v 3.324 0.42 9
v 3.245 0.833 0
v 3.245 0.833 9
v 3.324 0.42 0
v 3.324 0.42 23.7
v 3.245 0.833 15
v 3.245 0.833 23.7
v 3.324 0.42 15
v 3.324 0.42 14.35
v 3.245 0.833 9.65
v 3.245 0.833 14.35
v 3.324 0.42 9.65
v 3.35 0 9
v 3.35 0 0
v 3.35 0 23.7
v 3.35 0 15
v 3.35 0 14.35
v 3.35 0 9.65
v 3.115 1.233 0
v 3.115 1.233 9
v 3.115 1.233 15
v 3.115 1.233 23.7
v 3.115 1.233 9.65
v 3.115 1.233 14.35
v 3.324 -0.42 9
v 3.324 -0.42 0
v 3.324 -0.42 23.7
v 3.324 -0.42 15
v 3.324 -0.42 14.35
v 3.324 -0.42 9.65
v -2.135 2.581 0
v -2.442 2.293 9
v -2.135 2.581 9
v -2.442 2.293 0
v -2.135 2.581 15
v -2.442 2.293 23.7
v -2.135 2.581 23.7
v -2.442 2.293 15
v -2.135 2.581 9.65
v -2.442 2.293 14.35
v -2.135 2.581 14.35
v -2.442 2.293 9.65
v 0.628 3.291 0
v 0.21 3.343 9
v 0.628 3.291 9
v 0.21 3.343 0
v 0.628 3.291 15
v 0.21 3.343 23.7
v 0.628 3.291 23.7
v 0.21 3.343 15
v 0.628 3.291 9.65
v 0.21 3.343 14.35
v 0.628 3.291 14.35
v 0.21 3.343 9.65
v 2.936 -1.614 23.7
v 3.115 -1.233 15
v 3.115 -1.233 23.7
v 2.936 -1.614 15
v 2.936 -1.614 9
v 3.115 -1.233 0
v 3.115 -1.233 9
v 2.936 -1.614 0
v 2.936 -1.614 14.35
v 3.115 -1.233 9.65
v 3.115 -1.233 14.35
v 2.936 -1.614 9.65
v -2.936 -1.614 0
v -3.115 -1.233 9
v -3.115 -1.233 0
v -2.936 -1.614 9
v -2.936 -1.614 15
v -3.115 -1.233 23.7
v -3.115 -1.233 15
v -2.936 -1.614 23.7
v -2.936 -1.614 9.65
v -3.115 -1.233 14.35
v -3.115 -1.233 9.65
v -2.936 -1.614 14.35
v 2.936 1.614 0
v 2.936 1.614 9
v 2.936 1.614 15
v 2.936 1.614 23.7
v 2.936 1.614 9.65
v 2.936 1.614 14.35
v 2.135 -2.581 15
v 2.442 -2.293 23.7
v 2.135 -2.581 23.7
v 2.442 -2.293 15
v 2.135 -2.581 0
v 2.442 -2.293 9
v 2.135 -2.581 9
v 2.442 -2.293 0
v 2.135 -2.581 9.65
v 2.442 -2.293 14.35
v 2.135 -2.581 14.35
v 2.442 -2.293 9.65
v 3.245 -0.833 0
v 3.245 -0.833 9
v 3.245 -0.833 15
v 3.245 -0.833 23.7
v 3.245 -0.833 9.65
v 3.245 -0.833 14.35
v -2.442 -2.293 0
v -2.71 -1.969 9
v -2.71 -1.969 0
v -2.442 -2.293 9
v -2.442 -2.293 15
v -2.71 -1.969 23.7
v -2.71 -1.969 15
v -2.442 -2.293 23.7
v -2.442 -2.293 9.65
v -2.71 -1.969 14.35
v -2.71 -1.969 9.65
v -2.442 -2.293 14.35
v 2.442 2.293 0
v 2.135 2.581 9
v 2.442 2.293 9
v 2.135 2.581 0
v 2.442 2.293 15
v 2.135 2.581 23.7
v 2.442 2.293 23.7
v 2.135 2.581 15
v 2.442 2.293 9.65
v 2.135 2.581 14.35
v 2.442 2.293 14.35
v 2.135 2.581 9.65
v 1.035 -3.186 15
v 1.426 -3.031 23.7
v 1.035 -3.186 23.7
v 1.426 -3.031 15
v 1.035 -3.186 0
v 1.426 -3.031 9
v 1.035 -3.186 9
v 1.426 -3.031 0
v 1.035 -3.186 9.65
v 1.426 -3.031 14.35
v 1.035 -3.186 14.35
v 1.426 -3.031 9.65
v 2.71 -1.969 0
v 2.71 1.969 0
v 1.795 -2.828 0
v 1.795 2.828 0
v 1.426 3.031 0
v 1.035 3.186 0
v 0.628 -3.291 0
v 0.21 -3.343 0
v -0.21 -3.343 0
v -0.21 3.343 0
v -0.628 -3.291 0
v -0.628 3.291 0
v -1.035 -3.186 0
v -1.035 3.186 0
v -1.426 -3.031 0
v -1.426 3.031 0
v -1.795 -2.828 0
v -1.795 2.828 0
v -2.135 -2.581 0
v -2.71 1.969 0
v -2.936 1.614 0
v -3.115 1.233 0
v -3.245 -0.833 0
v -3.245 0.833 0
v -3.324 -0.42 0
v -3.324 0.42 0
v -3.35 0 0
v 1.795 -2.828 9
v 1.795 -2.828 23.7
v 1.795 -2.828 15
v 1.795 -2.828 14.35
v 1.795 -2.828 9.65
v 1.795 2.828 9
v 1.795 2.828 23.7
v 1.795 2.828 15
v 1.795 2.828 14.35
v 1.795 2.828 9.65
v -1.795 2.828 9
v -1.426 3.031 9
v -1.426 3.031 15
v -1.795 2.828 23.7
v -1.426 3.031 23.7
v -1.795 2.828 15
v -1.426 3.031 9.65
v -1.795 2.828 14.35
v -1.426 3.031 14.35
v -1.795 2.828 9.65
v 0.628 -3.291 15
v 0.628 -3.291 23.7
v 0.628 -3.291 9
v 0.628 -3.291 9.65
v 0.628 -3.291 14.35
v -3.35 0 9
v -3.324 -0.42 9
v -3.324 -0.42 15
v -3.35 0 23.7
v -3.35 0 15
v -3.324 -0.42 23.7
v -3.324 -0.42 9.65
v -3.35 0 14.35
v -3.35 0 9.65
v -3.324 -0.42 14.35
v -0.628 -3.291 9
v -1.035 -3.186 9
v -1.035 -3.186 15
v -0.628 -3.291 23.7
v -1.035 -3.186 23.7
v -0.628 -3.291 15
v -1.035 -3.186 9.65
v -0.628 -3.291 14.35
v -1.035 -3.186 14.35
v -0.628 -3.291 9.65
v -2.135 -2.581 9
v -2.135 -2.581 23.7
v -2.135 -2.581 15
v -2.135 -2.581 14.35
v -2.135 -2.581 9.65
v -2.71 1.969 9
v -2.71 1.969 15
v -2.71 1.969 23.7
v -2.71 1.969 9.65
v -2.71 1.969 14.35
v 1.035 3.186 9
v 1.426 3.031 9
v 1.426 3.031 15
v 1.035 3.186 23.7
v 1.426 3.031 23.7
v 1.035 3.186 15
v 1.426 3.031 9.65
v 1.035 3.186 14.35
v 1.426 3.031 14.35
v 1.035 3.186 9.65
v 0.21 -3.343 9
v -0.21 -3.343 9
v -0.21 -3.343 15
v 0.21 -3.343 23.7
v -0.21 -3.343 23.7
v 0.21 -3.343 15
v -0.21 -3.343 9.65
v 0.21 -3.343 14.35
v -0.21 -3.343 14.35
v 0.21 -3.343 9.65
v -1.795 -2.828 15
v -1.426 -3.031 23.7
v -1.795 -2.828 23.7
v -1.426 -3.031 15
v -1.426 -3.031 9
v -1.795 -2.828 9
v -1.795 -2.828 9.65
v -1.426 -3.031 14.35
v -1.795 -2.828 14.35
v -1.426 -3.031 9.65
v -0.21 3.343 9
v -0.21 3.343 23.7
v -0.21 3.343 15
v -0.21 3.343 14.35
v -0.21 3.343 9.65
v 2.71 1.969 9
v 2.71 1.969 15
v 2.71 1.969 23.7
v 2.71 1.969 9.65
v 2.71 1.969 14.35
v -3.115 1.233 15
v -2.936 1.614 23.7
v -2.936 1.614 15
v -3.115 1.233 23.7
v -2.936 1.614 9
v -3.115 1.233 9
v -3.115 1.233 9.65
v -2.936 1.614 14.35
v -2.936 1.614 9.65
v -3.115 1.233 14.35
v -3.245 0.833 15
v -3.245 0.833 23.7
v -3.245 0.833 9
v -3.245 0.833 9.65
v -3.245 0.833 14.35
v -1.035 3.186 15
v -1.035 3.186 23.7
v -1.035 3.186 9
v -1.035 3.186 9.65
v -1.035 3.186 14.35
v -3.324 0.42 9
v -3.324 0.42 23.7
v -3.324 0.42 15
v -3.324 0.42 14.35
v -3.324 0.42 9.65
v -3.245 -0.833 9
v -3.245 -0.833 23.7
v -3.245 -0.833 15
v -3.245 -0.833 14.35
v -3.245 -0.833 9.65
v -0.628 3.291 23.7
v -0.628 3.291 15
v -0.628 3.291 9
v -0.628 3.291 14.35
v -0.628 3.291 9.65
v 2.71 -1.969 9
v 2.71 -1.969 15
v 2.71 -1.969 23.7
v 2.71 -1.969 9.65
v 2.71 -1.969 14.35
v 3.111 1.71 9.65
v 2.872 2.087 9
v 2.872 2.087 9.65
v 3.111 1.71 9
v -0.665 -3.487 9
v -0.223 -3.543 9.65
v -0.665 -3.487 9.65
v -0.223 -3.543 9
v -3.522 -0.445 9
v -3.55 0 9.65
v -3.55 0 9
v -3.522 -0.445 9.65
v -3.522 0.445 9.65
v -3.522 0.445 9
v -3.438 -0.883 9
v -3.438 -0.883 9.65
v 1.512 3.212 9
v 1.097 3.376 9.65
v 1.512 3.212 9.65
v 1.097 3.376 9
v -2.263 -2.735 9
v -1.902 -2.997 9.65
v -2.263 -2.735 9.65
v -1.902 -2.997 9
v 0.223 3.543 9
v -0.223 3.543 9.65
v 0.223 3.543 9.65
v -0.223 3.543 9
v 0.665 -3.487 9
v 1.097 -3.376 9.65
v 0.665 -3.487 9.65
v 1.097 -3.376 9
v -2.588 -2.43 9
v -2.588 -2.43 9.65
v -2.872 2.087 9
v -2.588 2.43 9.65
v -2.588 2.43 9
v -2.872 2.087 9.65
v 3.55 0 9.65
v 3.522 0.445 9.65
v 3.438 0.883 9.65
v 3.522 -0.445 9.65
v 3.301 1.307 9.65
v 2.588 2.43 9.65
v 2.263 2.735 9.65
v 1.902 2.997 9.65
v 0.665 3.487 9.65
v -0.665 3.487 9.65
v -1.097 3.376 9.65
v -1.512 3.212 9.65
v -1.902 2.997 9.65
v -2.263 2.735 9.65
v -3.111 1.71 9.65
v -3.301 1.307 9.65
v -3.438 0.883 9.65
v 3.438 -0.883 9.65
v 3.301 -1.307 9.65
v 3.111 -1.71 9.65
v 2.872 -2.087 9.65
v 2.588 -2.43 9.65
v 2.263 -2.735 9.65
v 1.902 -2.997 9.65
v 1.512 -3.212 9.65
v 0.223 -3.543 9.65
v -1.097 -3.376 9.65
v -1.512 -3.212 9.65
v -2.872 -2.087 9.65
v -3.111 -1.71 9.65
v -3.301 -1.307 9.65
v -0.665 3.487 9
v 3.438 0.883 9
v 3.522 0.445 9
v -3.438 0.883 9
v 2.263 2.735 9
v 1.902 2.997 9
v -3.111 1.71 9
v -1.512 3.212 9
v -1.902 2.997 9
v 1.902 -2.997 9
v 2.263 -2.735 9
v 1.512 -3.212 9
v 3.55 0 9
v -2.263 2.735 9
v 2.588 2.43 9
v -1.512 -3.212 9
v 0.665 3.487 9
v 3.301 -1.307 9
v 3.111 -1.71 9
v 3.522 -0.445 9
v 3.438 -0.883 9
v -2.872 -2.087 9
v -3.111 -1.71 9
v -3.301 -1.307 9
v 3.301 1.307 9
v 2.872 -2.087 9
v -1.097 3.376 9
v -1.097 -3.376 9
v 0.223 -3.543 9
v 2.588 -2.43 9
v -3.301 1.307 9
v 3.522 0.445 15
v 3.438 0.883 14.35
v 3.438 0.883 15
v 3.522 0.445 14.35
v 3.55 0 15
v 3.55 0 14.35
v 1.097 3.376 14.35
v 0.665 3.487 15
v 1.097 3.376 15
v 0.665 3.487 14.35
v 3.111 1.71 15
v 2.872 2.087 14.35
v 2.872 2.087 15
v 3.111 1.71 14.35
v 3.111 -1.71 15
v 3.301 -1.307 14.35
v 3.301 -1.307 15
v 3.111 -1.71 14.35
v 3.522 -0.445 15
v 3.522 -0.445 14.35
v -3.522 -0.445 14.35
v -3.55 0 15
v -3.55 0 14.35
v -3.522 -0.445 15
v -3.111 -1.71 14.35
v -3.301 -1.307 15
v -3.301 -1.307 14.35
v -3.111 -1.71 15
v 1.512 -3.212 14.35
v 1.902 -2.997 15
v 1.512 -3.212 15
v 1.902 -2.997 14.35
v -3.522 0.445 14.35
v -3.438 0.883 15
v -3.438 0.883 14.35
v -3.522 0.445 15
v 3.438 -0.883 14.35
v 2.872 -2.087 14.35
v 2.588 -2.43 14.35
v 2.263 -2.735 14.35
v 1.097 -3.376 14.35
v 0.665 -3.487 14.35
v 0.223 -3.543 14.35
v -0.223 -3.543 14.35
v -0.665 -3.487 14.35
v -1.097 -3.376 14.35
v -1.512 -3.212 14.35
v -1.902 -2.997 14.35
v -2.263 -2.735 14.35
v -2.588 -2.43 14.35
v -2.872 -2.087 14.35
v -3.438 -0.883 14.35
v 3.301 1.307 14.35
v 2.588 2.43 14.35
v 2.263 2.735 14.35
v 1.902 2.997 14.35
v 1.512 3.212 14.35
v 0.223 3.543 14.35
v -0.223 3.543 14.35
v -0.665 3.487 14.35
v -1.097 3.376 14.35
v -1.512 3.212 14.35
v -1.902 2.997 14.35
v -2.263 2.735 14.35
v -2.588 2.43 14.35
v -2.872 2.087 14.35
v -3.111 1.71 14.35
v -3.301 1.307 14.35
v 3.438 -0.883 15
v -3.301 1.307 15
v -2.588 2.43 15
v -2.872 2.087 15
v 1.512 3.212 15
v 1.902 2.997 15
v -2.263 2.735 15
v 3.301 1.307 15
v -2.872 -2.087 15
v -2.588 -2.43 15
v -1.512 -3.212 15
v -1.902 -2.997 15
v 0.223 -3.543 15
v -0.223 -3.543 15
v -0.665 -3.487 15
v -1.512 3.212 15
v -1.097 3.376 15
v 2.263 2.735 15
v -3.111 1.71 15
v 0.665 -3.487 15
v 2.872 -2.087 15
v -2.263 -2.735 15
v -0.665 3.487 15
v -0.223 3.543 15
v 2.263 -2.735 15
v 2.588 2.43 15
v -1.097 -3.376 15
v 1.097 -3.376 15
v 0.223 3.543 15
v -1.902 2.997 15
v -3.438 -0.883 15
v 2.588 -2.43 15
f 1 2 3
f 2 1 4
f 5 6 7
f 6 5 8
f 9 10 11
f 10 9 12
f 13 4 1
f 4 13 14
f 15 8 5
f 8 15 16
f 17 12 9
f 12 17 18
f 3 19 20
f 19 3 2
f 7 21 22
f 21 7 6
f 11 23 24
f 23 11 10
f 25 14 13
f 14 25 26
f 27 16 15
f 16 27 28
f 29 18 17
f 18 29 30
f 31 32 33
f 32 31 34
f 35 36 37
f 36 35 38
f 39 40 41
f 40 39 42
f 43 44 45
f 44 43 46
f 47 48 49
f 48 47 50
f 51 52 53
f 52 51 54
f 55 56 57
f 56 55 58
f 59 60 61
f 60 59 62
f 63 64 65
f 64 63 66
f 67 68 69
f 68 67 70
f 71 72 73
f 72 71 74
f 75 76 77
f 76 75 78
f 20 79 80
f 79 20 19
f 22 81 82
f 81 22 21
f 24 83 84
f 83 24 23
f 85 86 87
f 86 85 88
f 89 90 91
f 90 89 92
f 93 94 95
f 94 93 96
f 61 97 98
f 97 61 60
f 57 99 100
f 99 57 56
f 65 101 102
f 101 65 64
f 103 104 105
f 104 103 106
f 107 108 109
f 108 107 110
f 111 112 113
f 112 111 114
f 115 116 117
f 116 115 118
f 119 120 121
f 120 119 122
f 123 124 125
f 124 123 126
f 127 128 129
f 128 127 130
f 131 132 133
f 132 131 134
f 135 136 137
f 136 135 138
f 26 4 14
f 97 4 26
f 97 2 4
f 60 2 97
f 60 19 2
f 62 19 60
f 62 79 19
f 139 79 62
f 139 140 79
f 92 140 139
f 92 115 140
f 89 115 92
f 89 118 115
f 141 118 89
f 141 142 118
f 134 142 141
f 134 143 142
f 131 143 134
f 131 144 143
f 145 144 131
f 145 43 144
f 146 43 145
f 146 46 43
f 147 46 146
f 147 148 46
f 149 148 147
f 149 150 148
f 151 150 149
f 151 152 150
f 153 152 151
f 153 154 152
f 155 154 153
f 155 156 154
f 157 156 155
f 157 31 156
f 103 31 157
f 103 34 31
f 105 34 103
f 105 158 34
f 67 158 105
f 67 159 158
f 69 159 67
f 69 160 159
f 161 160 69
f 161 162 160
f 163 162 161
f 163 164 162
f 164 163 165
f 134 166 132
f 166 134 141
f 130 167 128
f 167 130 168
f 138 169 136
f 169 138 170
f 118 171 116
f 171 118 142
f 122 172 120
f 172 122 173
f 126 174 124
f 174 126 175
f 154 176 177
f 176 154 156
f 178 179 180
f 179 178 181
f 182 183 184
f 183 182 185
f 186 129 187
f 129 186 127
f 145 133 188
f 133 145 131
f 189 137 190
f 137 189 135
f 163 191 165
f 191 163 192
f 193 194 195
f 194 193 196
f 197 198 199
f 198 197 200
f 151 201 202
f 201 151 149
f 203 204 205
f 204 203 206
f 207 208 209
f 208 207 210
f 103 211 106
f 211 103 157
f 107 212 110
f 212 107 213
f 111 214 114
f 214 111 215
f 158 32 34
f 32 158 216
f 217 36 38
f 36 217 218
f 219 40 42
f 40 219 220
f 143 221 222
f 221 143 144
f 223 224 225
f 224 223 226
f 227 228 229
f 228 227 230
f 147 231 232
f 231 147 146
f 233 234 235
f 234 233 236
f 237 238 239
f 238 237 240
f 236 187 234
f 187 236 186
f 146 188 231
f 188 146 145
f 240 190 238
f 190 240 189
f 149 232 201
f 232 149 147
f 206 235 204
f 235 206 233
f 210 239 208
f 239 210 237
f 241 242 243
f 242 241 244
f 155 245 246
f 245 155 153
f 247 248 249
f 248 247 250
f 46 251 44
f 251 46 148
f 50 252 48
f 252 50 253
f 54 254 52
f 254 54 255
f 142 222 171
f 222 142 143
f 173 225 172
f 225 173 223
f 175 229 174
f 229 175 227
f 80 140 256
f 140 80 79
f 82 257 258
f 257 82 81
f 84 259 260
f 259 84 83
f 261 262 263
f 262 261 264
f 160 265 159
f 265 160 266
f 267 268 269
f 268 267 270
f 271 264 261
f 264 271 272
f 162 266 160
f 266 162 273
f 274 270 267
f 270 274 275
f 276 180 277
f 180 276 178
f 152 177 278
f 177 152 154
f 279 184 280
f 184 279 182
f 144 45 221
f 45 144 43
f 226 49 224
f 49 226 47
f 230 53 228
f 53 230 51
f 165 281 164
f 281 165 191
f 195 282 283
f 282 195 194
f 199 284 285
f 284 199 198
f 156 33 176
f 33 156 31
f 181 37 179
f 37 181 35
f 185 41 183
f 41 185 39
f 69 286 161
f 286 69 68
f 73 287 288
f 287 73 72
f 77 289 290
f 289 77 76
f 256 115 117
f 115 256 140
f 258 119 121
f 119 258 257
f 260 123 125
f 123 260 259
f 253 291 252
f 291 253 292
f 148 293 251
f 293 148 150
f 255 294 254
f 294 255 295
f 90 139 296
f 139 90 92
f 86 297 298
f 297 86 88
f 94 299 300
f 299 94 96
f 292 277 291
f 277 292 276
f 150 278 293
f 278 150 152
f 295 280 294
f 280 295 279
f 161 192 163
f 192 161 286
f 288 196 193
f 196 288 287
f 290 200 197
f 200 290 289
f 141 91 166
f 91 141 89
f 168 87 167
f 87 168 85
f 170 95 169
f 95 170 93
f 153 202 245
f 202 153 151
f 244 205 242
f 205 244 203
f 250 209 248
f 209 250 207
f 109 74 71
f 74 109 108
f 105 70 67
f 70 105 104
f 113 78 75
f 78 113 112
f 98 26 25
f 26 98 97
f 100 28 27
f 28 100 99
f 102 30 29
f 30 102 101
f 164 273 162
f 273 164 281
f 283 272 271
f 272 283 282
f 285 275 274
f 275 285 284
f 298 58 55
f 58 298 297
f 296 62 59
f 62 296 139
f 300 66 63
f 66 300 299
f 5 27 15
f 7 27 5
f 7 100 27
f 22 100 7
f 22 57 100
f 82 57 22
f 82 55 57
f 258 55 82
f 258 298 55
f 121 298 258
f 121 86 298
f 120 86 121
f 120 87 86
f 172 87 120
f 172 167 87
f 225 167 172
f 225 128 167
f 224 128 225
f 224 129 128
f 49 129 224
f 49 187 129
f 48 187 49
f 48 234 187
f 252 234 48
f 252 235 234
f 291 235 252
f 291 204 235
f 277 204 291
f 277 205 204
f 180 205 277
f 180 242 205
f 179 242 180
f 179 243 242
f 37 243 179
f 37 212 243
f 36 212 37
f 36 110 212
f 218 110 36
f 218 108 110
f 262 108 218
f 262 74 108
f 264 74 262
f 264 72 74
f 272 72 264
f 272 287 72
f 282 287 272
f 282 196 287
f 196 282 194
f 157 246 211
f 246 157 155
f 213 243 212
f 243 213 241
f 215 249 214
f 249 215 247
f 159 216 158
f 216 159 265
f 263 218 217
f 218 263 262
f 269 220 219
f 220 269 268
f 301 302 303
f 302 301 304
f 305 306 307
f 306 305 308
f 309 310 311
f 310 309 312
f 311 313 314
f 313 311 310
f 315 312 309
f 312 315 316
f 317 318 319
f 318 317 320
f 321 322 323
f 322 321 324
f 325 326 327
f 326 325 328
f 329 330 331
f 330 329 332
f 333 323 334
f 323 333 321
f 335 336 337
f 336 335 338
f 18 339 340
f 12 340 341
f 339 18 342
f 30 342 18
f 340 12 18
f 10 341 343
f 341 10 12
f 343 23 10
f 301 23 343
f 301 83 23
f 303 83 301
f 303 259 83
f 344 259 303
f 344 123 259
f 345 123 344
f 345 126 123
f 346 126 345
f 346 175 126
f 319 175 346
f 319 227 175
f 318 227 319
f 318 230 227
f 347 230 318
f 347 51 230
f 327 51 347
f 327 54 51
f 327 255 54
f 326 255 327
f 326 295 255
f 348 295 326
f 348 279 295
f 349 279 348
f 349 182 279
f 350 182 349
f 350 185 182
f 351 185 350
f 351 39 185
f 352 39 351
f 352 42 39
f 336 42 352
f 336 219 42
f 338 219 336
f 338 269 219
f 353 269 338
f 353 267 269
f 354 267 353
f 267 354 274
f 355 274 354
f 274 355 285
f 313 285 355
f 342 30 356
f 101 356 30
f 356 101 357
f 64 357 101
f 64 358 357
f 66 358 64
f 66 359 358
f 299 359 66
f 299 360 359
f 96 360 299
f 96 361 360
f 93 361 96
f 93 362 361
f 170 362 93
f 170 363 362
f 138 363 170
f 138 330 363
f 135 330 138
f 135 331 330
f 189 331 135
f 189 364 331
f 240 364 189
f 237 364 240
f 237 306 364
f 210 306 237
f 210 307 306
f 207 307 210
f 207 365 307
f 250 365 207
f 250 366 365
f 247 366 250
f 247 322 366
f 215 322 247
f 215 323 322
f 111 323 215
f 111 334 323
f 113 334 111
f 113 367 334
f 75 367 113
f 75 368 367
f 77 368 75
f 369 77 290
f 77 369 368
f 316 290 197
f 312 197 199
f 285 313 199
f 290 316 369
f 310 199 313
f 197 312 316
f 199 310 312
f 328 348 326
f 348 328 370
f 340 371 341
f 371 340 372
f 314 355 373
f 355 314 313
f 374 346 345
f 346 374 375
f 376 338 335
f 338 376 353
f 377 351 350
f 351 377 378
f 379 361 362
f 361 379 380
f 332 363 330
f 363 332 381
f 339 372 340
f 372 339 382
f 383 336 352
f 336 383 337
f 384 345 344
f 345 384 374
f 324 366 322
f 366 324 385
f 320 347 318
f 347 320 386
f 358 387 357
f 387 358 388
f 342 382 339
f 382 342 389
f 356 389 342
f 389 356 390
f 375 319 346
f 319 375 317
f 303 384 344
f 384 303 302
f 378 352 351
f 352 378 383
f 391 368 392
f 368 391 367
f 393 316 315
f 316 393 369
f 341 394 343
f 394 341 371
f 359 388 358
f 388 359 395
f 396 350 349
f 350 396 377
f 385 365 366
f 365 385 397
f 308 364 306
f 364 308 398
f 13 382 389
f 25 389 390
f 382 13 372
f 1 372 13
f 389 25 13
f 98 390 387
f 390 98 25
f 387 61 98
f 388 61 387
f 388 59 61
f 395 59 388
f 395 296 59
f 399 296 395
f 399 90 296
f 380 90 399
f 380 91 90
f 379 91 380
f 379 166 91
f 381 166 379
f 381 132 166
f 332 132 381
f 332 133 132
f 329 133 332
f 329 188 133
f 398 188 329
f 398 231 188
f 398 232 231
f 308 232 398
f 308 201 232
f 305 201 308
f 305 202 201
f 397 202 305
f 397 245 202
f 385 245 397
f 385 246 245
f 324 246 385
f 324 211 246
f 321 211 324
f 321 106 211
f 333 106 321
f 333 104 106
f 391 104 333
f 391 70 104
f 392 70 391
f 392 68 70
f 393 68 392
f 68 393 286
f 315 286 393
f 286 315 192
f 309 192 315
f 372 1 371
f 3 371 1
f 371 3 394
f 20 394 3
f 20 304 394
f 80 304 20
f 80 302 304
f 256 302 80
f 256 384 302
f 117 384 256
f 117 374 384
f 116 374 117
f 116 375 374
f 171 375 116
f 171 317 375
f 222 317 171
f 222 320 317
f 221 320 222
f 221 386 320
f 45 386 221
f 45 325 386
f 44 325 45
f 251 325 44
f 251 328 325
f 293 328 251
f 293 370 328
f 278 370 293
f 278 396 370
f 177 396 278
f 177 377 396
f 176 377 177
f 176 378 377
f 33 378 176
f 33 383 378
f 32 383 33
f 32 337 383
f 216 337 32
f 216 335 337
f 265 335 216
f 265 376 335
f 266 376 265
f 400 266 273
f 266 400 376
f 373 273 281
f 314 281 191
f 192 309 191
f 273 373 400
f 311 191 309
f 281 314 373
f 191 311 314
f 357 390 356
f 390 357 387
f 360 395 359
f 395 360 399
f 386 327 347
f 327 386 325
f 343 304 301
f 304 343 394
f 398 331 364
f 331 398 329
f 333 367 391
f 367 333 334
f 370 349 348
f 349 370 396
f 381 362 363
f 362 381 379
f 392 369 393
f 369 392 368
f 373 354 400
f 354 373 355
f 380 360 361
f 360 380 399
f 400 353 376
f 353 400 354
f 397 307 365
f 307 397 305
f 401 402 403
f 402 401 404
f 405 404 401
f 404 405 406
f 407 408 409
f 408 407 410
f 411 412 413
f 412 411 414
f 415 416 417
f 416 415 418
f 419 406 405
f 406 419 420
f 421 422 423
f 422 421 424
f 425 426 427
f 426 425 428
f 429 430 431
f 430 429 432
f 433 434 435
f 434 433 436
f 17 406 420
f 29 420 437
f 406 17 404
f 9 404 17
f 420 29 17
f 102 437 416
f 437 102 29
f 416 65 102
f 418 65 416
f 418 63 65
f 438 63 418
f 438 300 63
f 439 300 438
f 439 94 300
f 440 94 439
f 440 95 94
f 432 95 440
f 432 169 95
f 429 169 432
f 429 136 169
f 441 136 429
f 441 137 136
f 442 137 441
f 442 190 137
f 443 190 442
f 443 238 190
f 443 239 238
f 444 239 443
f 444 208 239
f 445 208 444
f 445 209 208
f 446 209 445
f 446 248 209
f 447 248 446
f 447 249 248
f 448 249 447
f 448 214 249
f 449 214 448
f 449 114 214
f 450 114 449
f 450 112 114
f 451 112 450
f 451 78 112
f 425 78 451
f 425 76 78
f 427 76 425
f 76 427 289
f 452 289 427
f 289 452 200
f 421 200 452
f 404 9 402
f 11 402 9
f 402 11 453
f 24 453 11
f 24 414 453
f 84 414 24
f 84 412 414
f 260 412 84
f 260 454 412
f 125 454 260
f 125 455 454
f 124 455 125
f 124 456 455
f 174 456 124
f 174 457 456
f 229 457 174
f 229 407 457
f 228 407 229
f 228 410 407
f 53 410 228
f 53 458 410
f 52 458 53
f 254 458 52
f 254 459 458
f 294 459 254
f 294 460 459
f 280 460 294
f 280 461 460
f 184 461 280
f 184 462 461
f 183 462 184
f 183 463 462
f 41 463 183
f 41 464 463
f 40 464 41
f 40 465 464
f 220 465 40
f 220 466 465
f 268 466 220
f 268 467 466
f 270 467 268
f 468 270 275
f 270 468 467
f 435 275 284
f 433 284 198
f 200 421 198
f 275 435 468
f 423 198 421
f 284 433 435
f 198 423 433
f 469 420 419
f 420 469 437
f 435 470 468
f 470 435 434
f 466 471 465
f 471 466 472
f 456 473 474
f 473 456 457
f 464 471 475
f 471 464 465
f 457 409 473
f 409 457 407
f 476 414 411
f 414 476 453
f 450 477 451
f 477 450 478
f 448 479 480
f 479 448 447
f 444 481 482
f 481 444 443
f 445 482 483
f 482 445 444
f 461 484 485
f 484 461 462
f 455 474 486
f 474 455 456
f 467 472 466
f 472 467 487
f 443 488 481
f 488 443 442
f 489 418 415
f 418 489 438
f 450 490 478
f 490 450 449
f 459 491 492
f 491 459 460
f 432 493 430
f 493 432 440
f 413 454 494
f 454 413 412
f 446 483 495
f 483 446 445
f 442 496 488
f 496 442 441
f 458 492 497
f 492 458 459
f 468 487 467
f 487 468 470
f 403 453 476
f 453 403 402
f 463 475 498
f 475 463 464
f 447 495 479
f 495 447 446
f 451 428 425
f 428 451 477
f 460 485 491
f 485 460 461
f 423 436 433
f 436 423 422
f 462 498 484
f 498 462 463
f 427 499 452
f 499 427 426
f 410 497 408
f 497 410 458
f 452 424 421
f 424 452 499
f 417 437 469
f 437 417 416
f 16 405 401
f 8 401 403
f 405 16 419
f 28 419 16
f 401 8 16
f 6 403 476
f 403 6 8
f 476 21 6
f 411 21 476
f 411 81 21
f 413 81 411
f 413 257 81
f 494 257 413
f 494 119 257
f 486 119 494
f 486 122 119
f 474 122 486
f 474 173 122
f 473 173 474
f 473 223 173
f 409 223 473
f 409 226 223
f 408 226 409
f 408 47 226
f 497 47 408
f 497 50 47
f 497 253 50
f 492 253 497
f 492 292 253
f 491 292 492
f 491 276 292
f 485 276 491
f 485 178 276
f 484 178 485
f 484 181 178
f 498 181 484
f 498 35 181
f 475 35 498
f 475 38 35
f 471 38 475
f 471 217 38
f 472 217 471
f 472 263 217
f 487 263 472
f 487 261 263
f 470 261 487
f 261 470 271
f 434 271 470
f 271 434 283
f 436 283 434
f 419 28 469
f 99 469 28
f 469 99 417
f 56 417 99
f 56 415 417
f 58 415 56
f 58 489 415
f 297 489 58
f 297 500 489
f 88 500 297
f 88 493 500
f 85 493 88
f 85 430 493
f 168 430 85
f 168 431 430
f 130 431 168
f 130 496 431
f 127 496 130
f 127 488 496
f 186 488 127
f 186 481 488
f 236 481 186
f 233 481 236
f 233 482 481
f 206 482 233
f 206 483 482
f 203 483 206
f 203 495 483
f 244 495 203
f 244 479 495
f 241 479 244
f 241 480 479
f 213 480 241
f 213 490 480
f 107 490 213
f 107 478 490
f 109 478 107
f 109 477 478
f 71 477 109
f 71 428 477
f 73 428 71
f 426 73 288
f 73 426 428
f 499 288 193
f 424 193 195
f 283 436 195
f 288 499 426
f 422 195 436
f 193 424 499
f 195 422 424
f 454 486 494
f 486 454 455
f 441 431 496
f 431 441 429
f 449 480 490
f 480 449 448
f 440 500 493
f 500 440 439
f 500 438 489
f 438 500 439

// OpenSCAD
plugLength = 23.7;
plugDiameter = 6.7;
frictionRingsDiameter = 7.1;
frictionRing1Pos = 9;
frictionRing2Pos = 14.35;
$fn=50*1;

cylinder(plugLength, d=plugDiameter, true);
translate([0, 0, frictionRing1Pos]) {
    cylinder(0.65, d=frictionRingsDiameter, true);
}

translate([0, 0, frictionRing2Pos]) {
    cylinder(0.65, d=frictionRingsDiameter, true);
}
